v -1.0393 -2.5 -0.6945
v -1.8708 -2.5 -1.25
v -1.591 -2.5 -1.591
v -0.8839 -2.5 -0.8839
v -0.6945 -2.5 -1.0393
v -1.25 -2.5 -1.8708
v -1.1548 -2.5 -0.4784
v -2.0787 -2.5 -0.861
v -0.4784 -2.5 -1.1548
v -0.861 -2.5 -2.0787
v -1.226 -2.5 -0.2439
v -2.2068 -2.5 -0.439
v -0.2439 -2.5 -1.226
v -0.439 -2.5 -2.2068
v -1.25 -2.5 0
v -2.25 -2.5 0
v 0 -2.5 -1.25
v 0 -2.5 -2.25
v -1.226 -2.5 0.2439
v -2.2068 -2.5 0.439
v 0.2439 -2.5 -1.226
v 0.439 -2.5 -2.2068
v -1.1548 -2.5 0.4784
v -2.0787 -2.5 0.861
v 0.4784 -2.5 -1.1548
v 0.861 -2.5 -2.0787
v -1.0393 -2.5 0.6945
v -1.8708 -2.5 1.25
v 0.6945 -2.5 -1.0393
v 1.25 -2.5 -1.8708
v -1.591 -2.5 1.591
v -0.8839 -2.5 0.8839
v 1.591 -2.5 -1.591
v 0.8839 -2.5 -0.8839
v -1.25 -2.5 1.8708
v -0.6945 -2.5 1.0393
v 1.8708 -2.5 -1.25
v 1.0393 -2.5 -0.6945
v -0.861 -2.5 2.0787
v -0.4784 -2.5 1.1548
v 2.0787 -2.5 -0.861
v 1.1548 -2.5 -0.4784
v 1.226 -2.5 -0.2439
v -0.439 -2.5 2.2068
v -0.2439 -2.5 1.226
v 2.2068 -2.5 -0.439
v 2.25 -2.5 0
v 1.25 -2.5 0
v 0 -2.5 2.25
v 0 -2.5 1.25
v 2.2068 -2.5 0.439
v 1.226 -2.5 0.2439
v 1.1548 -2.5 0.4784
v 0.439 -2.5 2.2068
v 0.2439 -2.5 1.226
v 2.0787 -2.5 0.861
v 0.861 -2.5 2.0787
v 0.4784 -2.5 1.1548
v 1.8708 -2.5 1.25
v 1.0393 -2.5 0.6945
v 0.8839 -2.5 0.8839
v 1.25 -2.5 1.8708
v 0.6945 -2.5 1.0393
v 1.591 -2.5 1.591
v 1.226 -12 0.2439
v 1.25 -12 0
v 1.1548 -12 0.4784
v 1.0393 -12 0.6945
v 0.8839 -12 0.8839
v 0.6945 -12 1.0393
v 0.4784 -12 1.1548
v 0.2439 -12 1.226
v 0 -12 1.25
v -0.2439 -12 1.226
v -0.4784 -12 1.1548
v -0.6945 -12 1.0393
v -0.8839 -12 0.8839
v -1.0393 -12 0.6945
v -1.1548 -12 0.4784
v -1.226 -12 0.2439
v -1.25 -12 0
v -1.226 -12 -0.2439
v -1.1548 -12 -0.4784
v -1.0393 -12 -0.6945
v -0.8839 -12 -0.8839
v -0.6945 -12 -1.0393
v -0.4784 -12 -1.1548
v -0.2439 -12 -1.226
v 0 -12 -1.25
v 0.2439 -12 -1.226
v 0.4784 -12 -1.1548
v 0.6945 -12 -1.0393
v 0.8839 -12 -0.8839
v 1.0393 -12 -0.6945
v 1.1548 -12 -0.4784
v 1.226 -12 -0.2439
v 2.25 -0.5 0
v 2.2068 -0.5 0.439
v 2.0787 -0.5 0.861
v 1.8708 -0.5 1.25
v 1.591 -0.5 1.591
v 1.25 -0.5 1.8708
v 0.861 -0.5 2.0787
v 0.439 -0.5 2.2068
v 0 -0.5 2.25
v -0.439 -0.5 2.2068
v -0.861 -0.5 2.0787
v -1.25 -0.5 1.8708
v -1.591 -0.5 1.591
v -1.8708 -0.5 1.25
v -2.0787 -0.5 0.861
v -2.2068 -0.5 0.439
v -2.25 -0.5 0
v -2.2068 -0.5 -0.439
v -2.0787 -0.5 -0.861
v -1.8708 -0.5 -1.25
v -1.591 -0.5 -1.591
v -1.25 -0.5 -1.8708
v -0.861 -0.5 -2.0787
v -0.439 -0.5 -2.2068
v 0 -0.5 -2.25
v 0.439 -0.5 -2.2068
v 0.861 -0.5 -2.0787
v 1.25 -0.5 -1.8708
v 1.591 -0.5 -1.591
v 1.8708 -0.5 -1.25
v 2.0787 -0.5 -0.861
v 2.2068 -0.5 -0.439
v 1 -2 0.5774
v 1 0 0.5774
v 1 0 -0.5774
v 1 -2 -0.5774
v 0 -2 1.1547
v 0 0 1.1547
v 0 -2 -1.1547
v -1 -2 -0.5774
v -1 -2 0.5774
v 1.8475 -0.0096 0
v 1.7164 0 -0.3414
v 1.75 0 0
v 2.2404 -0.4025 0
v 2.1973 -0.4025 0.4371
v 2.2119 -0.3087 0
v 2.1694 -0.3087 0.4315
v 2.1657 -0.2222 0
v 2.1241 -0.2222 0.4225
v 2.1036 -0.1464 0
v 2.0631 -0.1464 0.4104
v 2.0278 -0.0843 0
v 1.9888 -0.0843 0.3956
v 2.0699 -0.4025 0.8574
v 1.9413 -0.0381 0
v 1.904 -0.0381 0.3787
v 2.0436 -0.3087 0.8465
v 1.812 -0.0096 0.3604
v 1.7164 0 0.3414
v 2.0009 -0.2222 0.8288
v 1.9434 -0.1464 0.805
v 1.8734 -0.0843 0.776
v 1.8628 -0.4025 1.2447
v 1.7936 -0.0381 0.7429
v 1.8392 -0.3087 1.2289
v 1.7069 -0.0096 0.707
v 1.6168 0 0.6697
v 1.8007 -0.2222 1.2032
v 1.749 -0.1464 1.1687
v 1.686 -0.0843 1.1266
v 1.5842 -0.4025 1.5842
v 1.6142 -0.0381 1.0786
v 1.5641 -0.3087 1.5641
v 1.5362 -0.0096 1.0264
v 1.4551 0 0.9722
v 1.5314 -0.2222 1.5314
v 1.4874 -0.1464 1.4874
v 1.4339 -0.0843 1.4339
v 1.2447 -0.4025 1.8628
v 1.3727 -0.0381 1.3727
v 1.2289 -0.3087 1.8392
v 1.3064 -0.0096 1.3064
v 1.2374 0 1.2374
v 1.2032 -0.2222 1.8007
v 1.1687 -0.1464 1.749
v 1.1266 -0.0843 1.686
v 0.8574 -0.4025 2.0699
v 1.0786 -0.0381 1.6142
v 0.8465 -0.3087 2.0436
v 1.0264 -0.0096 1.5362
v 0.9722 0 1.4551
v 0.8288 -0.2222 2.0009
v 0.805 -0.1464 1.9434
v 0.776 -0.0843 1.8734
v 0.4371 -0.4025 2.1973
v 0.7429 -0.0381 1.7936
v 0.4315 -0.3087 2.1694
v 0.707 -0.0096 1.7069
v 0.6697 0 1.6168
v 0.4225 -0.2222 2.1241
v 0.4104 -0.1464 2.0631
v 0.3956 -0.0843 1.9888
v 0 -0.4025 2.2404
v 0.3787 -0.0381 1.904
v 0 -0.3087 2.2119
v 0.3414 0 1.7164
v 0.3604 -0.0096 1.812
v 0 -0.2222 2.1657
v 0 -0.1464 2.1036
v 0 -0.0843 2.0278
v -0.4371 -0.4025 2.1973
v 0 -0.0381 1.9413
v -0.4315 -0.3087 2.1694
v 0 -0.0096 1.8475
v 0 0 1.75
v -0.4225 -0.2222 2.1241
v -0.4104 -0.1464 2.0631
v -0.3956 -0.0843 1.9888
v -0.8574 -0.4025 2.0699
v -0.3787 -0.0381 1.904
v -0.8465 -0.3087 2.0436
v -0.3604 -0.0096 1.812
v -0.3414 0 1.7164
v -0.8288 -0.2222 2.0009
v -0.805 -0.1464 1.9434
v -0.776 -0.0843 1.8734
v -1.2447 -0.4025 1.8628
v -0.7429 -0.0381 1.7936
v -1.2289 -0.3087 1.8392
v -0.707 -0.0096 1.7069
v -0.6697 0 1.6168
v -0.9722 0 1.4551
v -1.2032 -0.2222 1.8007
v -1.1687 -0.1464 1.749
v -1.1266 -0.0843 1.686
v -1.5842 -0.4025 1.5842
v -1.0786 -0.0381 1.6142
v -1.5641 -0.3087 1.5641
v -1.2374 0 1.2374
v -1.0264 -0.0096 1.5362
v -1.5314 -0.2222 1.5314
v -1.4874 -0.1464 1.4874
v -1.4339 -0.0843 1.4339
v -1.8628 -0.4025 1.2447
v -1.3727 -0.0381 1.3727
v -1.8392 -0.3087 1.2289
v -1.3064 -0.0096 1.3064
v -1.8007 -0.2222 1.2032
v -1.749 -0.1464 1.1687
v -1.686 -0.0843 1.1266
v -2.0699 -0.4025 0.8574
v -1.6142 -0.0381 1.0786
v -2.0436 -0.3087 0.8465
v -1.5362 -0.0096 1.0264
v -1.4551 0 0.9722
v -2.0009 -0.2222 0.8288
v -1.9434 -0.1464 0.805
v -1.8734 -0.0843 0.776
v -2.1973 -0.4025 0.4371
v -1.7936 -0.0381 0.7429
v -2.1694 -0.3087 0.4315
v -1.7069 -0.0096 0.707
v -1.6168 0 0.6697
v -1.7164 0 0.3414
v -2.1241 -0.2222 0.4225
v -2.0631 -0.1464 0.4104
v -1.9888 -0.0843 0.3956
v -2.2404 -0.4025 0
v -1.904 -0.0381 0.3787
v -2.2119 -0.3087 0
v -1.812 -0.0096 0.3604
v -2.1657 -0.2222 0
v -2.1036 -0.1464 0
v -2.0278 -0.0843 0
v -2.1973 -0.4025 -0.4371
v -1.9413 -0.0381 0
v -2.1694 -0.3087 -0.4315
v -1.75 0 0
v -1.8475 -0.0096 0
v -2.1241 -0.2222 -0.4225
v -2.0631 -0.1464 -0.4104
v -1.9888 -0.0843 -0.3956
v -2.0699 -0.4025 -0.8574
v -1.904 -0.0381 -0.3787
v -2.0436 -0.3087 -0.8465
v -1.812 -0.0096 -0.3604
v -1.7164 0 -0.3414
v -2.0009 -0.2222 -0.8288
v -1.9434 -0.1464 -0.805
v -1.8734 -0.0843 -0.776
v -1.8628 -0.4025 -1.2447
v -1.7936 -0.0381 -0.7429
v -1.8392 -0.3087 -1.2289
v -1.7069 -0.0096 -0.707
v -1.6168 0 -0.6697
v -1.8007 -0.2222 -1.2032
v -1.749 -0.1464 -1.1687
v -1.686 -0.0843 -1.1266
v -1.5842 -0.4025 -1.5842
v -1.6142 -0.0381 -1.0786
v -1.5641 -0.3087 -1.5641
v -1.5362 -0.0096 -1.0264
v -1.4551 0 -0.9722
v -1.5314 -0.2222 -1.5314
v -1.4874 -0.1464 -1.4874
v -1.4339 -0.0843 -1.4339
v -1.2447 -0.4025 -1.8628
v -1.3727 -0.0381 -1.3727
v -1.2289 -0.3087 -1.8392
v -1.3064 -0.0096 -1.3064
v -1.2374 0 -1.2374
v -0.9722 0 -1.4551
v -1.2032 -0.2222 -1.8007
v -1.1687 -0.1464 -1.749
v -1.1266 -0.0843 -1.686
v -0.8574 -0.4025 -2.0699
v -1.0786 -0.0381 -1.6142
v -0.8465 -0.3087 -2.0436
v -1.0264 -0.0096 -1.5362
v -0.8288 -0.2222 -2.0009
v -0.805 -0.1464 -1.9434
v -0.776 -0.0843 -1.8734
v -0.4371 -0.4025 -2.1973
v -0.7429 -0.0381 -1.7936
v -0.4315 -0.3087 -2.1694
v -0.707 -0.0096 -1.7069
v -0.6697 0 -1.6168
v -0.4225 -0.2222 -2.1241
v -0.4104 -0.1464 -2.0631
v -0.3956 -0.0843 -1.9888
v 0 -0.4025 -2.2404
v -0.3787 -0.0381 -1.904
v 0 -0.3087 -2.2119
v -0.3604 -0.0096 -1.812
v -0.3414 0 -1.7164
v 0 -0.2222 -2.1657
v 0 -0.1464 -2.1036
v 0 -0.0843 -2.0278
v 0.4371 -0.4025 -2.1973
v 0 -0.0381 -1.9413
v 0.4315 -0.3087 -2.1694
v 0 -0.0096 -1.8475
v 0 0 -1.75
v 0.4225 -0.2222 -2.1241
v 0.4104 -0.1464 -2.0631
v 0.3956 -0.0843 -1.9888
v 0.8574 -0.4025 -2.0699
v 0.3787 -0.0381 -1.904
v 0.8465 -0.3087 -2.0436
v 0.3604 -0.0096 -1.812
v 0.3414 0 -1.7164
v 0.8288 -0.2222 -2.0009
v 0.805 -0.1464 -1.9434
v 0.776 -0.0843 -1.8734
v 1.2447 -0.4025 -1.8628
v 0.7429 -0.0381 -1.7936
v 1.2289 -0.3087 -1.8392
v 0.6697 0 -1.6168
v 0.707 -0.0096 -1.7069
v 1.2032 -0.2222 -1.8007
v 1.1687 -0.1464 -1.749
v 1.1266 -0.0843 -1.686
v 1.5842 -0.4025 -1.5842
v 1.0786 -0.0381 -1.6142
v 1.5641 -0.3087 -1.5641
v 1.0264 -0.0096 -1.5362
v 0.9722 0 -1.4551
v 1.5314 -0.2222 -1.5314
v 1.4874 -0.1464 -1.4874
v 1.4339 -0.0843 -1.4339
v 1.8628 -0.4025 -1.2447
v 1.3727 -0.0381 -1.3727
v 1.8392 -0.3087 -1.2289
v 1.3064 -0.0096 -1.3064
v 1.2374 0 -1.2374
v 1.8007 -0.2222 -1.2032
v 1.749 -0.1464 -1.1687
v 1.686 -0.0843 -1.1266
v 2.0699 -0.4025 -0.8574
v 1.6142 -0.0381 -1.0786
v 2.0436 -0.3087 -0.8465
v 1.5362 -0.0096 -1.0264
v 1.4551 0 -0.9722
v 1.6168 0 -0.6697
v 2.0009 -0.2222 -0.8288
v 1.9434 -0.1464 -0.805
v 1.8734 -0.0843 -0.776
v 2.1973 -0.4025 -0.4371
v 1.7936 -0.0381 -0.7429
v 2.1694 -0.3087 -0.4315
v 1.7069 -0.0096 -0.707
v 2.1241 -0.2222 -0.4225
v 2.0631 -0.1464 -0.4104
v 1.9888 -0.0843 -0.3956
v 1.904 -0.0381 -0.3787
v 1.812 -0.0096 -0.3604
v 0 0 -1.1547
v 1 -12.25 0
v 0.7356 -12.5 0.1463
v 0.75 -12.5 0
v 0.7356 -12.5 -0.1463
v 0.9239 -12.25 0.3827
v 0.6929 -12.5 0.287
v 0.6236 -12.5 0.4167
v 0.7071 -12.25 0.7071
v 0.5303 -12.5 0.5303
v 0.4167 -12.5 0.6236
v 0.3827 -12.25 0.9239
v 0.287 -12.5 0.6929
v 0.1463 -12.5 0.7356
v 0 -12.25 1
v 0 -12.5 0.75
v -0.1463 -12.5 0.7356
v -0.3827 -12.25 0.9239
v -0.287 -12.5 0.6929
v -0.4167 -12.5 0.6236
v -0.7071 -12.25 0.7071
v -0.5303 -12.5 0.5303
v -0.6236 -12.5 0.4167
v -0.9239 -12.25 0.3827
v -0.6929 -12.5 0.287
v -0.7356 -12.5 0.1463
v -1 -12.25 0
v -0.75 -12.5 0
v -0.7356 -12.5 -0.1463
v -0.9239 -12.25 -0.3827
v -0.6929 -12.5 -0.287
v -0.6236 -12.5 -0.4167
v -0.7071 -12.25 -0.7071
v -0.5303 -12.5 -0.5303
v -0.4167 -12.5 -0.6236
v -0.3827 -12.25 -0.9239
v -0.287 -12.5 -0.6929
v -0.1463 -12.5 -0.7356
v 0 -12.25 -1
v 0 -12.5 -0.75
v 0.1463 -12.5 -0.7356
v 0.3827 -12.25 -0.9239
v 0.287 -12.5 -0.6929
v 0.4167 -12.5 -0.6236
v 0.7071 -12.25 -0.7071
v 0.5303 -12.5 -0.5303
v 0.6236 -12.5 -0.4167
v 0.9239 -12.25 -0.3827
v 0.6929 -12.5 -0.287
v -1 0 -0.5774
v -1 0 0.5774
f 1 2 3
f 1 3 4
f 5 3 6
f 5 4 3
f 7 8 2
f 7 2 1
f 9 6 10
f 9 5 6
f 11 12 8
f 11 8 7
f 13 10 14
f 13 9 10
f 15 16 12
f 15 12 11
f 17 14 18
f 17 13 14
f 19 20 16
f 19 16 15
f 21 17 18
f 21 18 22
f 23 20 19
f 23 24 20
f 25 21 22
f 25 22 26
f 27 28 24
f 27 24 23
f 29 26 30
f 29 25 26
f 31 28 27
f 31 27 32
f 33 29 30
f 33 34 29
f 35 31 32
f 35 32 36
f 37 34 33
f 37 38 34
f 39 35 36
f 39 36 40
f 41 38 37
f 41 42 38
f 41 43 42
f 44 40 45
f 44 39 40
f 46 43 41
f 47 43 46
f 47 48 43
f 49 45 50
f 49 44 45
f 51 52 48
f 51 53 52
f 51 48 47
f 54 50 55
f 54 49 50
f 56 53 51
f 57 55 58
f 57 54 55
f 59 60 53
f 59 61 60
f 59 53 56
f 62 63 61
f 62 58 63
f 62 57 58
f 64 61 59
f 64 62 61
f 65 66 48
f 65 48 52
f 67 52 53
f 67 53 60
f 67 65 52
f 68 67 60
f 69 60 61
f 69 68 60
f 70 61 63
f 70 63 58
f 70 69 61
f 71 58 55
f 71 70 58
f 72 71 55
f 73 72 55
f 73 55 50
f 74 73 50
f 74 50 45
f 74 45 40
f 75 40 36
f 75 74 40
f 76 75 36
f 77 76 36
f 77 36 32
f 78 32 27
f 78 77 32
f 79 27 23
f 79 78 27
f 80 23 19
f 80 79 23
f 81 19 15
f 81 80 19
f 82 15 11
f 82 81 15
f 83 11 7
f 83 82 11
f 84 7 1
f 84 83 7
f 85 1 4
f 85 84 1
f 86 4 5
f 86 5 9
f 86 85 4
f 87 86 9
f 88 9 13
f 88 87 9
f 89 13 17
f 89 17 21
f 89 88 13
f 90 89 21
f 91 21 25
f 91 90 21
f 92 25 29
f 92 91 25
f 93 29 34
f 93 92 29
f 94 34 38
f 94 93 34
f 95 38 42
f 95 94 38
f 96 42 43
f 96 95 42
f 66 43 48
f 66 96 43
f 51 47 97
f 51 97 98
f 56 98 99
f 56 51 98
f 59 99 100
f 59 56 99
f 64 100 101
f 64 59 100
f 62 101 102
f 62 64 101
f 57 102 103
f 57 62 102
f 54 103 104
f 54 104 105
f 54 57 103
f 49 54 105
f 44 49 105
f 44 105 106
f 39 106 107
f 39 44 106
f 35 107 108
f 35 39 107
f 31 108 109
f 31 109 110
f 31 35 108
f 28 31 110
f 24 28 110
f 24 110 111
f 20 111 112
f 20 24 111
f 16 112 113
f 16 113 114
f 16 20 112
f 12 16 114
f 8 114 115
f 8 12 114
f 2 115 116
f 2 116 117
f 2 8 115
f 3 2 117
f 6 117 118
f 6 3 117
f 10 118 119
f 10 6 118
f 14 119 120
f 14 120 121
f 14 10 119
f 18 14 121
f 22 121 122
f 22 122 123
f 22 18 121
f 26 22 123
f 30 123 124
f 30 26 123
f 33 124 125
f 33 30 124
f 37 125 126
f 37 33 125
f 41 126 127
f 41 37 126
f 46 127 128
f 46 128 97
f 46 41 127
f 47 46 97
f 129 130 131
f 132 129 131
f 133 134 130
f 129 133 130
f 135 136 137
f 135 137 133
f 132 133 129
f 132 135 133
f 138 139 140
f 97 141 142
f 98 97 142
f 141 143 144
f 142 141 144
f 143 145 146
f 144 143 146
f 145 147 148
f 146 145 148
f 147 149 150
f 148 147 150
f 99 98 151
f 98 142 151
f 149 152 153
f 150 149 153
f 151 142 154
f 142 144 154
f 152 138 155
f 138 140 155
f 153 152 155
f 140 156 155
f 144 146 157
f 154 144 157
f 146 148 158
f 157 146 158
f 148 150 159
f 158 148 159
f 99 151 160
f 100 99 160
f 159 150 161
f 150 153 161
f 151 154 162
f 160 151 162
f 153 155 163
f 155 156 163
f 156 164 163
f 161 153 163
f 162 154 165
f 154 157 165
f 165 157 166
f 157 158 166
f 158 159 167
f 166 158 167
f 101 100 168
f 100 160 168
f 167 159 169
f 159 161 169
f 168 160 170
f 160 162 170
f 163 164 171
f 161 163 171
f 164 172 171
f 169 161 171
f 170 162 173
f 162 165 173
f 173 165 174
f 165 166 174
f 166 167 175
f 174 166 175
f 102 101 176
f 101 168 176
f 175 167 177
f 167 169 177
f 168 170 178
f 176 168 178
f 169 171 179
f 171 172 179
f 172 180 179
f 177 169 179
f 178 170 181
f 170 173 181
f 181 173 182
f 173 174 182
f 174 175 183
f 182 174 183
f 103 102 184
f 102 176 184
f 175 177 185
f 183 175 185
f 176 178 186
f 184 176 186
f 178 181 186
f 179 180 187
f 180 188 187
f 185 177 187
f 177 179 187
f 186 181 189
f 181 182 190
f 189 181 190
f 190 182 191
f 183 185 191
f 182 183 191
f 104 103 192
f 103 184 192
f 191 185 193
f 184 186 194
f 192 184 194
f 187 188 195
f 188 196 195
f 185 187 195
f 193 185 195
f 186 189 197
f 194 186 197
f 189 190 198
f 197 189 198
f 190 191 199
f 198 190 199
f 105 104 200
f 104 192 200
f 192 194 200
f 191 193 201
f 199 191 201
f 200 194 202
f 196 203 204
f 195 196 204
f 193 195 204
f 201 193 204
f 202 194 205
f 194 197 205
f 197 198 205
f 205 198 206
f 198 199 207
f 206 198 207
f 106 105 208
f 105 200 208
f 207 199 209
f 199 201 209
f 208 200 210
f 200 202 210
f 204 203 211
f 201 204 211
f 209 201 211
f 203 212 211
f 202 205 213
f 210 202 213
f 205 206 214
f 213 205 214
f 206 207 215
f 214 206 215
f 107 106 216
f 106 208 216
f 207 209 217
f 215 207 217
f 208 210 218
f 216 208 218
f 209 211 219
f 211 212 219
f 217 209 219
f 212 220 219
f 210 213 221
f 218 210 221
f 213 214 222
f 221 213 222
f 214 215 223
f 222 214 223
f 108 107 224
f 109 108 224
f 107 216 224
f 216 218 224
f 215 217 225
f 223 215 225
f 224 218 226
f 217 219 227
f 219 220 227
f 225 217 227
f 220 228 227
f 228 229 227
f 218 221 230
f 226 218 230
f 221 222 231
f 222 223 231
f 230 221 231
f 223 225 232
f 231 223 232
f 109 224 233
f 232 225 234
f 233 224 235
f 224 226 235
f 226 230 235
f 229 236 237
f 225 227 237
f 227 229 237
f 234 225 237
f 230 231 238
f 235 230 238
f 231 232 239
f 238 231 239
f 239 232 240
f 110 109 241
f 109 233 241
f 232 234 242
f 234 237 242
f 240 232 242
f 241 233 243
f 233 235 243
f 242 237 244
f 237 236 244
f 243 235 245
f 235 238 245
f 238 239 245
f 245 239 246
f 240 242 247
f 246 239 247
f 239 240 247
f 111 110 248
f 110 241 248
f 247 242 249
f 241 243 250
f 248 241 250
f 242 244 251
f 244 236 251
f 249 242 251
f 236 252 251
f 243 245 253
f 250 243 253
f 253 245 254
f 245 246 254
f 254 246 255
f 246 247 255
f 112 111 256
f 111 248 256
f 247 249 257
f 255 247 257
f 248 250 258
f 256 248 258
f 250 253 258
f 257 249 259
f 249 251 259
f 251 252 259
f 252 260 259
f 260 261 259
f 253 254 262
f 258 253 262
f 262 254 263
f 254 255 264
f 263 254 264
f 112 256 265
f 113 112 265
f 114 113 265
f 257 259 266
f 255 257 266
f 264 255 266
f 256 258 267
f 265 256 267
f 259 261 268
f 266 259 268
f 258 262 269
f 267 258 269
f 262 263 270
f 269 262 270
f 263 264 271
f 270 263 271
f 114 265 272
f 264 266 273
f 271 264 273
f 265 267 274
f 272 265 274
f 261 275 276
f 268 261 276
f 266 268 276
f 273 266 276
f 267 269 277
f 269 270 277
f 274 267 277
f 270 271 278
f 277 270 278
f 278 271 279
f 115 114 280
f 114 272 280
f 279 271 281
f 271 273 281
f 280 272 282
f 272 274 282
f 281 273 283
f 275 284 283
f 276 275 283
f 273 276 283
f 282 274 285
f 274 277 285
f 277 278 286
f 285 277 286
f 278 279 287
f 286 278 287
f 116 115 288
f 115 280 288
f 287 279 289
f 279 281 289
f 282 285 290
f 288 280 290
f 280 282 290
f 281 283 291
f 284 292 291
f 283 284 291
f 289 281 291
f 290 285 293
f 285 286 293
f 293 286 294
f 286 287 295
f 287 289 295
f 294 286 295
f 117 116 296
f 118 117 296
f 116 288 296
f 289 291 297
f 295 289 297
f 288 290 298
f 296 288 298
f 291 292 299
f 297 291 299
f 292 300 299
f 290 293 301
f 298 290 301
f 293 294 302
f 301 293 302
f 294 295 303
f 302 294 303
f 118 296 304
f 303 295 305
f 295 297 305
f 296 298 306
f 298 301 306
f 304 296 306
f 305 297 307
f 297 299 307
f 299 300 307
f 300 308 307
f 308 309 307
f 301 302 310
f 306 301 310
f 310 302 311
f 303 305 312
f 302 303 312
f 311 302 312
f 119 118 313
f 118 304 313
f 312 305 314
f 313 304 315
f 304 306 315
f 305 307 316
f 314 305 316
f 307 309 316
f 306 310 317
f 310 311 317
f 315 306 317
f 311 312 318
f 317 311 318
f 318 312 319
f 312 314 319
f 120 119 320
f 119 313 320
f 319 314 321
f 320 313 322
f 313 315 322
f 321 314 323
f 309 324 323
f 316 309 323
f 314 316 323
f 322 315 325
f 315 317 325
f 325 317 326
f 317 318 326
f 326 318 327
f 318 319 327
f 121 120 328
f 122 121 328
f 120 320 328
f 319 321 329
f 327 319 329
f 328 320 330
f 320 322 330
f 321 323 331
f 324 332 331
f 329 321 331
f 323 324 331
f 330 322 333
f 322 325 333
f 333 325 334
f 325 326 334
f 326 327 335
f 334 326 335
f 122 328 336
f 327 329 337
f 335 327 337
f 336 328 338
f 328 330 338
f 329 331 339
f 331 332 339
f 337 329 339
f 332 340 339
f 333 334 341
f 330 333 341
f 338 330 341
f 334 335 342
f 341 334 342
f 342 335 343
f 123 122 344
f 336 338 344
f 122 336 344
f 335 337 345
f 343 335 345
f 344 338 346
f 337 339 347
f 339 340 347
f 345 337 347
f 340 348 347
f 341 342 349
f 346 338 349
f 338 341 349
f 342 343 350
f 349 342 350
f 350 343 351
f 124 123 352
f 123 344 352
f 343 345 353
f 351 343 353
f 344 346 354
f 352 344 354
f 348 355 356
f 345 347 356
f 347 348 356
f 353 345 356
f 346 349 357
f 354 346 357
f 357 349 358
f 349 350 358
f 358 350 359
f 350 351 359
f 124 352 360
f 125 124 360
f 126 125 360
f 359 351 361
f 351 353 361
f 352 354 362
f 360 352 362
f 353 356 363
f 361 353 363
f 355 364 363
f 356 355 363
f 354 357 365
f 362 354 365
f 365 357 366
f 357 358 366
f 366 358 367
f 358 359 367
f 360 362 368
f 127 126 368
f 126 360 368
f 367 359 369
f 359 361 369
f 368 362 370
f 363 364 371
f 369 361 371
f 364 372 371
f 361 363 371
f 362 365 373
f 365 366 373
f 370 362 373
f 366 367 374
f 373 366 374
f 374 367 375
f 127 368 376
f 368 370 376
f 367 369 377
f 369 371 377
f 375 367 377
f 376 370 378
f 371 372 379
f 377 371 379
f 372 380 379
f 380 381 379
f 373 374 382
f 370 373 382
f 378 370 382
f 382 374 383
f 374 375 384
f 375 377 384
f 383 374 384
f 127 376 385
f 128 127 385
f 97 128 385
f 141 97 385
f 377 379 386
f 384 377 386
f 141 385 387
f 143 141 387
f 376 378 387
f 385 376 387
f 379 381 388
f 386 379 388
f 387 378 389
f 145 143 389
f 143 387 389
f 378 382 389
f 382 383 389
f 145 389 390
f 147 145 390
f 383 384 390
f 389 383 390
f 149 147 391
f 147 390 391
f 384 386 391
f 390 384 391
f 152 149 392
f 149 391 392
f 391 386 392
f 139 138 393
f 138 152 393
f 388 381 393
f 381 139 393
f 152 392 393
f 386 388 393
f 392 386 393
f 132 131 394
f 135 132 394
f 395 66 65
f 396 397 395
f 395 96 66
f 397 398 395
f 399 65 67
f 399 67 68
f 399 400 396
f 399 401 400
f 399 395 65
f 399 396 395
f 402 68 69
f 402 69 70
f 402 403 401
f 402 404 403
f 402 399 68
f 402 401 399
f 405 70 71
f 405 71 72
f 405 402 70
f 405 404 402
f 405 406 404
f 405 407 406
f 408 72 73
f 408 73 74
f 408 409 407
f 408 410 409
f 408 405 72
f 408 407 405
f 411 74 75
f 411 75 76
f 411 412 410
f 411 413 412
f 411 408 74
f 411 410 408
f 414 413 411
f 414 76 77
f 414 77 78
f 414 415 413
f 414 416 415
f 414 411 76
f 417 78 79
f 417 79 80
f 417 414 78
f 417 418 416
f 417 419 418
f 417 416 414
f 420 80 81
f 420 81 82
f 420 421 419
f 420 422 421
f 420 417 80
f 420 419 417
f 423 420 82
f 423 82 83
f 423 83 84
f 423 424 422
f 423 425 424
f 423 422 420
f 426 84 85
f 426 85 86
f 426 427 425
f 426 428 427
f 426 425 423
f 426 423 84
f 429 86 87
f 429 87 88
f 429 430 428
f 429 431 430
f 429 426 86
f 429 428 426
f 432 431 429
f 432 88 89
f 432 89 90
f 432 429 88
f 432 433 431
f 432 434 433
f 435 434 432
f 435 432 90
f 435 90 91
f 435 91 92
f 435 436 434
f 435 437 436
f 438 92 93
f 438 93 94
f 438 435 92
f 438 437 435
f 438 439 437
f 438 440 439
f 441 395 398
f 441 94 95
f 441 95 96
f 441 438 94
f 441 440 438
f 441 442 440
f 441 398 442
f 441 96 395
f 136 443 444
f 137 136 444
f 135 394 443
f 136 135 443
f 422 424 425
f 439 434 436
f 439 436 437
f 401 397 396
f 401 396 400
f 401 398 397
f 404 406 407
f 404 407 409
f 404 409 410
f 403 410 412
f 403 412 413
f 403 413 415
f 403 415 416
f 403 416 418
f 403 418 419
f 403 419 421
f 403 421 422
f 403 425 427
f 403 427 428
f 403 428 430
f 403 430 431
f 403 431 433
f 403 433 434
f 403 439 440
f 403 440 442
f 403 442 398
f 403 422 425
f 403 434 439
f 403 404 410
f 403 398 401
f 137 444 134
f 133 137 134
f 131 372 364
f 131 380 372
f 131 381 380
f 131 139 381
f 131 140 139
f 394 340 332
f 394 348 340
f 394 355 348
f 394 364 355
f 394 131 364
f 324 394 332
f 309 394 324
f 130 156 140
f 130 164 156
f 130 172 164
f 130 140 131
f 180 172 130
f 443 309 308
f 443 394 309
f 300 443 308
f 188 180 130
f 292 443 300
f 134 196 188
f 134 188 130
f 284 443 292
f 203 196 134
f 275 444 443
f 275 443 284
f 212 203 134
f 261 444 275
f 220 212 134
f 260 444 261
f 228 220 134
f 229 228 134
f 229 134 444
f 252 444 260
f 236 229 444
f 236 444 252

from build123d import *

# Parameters (mm, degrees)
CORTAR_EXTRUIR1_DEPTH = 2
CHAFL_N1_SIZE         = 0.5
REDONDEO1_R           = 0.5


with BuildPart() as part:
    # Croquis1 → Revolución1 (revolve)
    with BuildSketch(Plane.XY):
        Polygon((0, 0), (2.25, 0), (2.25, -2.5), (1.25, -2.5), (1.25, -12.5), (0, -12.5), align=None)
    revolve(axis=Axis((0, 0, 0), (0, -1, 0)))

    # Croquis2 → Cortar-Extruir1 (cut)
    with BuildSketch(Plane(origin=(0, 0, 0), x_dir=(1, 0, 0), z_dir=(0, 1, 0))):
        Polygon((1, 0.577350269), (0, 1.154700538), (-1, 0.577350269), (-1, -0.577350269), (0, -1.154700538), (1, -0.577350269), align=None)
    extrude(amount=-CORTAR_EXTRUIR1_DEPTH, mode=Mode.SUBTRACT)

    # Chaflán1
    chafl_n1_edges = [part.edges().sort_by_distance(p)[0] for p in [
        (-1.25, -12.5, 0),
    ]]
    chamfer(chafl_n1_edges, length=CHAFL_N1_SIZE)

    # Redondeo1
    redondeo1_edges = [part.edges().sort_by_distance(p)[0] for p in [
        (-2.25, 0, 0),
    ]]
    fillet(redondeo1_edges, radius=REDONDEO1_R)


solid = part.part
